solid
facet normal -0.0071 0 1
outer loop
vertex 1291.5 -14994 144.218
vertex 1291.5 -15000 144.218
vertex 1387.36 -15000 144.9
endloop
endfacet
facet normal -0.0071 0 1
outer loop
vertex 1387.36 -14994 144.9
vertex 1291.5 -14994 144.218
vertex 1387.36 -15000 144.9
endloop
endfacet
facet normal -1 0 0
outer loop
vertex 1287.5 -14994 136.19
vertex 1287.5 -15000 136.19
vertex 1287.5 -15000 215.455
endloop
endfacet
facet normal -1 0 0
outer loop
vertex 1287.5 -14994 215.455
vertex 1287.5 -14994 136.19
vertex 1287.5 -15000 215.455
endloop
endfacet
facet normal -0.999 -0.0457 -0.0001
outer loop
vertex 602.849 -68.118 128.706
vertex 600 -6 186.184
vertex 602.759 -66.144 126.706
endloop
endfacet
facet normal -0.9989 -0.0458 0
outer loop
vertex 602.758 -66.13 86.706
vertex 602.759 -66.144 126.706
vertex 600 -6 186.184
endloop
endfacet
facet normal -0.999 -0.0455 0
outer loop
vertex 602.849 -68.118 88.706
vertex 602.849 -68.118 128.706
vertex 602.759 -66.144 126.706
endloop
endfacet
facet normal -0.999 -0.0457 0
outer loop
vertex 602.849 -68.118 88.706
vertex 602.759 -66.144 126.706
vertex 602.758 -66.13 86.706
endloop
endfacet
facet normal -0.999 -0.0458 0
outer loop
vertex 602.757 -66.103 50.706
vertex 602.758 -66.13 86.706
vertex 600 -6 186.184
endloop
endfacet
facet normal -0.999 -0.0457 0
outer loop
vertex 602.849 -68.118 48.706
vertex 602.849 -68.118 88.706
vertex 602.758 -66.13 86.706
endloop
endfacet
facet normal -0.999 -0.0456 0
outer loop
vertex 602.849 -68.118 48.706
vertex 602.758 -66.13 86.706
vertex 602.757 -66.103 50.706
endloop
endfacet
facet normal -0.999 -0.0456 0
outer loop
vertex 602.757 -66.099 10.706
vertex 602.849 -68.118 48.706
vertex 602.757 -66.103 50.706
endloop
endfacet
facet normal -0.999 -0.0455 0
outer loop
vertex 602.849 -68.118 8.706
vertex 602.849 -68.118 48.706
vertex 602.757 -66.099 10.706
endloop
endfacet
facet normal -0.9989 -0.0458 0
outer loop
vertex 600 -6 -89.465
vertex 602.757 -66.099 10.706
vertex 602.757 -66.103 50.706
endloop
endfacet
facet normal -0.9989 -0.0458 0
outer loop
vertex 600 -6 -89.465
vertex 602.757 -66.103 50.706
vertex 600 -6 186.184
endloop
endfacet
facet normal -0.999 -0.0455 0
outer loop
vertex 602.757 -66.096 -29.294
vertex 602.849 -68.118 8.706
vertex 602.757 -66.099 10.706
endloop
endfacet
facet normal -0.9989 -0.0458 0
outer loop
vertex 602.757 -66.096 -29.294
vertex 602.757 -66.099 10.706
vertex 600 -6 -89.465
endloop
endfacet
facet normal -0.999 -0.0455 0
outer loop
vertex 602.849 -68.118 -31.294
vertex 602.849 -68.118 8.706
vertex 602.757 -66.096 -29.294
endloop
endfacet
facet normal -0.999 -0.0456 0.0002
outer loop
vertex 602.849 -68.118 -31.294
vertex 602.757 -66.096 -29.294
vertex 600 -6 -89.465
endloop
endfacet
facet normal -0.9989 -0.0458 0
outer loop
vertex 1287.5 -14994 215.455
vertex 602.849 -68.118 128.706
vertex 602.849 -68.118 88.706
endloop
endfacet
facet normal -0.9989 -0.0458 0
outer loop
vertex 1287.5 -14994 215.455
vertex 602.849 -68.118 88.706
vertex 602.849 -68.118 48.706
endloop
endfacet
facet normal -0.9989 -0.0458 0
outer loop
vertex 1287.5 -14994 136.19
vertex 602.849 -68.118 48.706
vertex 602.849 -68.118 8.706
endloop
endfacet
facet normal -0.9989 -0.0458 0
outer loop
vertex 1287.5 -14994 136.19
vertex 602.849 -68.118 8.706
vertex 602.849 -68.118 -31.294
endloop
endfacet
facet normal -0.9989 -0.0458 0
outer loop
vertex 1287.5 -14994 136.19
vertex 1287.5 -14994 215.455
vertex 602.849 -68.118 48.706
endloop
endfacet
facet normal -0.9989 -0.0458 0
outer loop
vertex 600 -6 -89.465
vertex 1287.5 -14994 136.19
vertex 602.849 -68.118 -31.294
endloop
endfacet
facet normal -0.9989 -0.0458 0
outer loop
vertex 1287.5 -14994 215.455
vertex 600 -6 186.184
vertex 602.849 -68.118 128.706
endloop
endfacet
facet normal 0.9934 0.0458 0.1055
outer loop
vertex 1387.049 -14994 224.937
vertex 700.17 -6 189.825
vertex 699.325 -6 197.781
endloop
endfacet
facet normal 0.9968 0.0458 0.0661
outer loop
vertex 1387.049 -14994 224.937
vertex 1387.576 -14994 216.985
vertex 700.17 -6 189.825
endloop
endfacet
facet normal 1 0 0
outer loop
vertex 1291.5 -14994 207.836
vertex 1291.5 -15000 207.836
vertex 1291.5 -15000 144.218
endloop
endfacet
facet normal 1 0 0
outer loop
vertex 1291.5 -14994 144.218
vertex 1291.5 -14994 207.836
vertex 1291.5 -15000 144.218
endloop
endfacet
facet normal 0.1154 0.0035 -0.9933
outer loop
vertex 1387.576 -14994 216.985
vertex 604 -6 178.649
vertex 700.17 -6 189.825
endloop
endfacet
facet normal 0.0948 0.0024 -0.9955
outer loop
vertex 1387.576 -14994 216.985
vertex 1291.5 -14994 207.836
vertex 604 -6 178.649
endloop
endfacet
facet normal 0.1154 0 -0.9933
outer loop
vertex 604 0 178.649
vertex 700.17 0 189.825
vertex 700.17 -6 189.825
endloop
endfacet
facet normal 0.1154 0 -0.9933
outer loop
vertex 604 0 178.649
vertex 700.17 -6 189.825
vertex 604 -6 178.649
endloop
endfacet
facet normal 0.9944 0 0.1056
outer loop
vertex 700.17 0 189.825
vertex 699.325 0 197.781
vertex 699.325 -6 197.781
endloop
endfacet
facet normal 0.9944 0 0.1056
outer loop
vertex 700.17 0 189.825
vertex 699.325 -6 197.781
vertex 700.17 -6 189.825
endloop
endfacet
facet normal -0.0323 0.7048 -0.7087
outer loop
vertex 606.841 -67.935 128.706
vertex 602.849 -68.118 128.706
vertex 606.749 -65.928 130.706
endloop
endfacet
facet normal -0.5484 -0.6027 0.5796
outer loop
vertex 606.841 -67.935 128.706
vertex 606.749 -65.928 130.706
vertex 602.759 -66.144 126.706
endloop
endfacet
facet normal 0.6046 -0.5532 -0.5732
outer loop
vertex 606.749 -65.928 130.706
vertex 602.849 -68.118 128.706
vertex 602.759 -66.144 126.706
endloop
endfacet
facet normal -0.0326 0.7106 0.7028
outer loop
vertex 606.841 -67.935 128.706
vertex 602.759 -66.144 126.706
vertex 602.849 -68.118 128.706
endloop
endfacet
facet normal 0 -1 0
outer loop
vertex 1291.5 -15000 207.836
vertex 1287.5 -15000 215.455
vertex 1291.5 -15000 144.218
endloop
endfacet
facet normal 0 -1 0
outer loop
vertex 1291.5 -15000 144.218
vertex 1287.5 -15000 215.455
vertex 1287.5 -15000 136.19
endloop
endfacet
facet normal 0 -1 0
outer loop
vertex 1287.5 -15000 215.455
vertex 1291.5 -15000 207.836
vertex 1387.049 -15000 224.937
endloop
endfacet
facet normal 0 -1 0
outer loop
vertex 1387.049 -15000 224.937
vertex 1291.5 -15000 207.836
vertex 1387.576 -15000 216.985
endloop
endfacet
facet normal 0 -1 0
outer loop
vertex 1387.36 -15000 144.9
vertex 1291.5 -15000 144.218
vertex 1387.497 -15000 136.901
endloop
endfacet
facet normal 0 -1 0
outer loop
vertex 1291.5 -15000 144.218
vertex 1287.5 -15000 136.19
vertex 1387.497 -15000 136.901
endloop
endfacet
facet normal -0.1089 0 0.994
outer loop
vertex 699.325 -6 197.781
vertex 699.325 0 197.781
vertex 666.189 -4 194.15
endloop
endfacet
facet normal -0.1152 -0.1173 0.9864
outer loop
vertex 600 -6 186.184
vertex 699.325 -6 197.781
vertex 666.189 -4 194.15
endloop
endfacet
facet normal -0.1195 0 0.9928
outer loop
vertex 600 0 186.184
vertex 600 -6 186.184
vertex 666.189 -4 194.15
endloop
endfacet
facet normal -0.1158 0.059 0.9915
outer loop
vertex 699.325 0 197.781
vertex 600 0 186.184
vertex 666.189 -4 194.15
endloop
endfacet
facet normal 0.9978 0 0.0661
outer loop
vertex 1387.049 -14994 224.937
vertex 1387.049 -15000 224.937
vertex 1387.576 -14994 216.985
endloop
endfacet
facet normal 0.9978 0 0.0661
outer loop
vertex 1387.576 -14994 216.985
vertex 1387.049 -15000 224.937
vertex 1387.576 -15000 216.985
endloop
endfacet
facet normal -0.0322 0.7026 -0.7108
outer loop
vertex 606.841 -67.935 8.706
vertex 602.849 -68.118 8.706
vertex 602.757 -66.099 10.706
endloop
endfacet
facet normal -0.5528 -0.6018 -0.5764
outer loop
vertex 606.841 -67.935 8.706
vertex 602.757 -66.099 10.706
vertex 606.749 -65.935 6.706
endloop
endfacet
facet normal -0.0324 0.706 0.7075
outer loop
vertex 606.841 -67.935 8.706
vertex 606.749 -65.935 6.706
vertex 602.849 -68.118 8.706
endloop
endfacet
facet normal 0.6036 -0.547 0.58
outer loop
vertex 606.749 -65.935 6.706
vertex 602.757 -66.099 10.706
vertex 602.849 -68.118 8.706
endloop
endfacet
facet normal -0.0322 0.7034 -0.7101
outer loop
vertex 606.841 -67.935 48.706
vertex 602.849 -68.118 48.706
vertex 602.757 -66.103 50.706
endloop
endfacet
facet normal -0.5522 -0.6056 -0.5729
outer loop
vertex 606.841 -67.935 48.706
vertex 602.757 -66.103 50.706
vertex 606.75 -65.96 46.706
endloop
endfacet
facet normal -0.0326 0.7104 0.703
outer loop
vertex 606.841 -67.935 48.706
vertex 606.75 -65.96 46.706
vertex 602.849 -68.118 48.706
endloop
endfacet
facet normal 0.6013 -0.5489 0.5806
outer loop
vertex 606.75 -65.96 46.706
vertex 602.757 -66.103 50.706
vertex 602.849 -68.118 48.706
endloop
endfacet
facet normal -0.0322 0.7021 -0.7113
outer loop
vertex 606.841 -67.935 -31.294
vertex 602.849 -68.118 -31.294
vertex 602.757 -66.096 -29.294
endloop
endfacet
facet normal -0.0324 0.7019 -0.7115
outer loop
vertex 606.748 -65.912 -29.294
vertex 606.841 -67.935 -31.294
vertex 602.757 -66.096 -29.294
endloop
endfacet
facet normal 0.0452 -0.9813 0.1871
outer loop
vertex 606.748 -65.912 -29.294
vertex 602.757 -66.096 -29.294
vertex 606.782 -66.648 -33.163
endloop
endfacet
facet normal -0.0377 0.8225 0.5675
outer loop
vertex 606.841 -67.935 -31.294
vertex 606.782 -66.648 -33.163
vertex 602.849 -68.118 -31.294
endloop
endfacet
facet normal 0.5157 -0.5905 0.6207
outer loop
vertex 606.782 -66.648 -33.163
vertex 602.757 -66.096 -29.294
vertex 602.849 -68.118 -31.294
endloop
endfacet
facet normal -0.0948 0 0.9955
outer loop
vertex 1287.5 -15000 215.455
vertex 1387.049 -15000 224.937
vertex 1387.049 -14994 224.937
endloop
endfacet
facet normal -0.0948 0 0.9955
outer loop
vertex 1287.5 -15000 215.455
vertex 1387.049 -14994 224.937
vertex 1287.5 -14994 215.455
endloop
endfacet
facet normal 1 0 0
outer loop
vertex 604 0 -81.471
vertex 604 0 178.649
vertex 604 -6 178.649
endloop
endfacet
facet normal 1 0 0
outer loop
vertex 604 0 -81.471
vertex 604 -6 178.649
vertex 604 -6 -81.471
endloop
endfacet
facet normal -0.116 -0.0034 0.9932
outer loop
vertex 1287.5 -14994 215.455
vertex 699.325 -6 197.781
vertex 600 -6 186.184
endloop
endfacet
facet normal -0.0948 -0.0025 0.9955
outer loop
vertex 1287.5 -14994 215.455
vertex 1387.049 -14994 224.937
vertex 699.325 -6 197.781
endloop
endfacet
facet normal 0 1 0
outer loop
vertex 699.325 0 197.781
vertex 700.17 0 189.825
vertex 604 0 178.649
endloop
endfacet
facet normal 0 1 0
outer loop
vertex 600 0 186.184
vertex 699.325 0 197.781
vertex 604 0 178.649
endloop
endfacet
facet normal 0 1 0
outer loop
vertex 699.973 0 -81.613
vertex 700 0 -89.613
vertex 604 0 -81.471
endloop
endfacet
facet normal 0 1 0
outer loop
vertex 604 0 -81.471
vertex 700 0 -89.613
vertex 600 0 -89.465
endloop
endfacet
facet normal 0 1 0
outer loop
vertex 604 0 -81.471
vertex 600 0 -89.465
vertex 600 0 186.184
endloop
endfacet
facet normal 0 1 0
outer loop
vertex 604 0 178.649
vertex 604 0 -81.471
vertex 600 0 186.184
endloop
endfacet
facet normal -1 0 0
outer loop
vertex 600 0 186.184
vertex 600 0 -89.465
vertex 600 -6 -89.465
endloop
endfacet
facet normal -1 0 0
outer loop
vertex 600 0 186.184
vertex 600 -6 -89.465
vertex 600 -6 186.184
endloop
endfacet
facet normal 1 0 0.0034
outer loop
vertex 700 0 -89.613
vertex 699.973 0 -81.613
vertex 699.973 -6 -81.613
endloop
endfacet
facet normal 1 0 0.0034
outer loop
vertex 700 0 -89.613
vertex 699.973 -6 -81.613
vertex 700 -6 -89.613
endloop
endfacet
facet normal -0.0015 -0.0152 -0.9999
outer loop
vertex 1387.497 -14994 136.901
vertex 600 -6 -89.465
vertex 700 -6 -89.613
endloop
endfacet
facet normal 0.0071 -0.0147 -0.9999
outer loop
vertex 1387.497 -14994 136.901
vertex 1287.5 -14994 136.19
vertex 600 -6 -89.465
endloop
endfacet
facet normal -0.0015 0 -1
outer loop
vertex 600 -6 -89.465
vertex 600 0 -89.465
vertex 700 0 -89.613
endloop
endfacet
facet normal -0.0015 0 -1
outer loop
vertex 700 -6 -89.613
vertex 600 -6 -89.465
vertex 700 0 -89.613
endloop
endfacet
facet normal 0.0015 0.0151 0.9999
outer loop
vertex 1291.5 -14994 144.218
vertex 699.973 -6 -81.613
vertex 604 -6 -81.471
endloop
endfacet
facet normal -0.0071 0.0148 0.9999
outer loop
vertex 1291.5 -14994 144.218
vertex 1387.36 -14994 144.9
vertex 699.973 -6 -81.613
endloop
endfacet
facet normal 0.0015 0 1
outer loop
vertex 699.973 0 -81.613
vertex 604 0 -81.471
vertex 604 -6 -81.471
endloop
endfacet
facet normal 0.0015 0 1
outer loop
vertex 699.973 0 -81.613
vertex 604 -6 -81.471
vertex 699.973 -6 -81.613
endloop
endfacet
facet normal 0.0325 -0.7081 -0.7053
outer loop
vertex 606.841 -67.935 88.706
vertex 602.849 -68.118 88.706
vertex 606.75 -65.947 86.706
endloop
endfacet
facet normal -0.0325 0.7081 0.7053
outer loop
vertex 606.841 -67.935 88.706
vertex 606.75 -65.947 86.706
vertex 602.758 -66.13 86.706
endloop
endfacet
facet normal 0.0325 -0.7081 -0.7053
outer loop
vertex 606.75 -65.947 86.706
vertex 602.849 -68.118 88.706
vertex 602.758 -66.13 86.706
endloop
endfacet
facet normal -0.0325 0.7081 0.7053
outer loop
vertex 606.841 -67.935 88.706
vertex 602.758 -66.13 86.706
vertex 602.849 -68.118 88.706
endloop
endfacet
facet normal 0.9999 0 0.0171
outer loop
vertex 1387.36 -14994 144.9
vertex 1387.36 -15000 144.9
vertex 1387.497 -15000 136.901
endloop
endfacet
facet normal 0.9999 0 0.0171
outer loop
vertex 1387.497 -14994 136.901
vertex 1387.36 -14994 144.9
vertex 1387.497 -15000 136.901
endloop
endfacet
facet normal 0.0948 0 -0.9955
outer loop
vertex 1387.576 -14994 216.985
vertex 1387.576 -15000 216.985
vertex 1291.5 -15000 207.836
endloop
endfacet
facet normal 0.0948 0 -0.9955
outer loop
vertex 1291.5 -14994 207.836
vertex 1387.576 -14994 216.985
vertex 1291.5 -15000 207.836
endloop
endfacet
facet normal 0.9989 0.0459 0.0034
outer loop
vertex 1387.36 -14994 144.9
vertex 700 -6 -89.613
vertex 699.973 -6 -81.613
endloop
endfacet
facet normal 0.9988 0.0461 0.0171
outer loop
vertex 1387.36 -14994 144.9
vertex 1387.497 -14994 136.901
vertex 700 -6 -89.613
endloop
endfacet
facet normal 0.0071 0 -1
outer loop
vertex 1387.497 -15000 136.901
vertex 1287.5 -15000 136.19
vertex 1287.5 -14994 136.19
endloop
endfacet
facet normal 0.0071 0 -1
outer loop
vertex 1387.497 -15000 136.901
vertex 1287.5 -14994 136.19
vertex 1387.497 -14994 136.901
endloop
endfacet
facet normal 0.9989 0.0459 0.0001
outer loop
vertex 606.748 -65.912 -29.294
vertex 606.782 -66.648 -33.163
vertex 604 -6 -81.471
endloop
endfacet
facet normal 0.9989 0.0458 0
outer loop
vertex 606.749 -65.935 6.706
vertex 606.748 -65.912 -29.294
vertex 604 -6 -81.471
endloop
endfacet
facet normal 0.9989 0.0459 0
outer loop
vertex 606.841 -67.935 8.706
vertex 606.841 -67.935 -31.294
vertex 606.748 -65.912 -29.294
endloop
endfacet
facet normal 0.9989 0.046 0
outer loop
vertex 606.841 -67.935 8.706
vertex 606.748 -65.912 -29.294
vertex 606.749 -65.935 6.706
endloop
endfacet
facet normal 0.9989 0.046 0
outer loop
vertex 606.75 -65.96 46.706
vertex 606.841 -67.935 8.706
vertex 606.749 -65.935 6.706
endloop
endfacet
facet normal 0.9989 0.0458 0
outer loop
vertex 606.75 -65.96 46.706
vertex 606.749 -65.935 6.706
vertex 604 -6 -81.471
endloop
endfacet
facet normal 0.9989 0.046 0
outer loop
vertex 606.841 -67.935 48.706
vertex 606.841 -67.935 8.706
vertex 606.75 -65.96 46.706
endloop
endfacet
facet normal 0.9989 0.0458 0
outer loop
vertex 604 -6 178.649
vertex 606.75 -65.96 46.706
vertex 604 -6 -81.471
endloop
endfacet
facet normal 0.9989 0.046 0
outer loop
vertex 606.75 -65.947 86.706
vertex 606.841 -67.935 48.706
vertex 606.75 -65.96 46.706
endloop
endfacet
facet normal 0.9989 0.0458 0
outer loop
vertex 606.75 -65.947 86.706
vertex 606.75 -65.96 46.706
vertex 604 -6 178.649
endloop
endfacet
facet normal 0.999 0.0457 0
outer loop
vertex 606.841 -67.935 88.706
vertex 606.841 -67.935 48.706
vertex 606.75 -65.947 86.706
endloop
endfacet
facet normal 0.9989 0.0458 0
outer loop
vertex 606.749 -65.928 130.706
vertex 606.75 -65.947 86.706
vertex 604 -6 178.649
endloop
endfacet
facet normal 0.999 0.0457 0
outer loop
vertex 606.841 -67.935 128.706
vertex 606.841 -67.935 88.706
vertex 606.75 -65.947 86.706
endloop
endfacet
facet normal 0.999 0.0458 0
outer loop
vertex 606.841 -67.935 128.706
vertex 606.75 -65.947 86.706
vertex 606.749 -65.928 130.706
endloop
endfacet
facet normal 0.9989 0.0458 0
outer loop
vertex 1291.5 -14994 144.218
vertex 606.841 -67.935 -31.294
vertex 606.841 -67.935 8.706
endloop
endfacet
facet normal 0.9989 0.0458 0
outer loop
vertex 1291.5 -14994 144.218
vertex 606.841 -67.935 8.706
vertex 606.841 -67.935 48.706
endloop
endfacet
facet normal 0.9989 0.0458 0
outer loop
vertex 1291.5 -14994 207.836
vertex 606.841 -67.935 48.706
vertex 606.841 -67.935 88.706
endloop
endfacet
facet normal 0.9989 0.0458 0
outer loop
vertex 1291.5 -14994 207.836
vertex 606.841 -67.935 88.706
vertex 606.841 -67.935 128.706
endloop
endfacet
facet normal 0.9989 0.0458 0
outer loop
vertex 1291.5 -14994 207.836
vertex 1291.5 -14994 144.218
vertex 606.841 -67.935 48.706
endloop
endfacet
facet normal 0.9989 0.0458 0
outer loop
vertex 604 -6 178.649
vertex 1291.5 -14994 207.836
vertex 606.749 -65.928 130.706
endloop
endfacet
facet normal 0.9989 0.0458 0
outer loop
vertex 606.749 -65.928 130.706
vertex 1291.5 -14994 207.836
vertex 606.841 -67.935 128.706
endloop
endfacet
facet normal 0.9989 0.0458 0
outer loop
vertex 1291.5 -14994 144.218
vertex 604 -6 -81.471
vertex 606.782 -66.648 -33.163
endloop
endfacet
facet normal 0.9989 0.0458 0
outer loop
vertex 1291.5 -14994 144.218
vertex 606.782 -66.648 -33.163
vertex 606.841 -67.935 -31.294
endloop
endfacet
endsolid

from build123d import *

# Parameters (mm, degrees)
BOSS_EXTRUDE1_DEPTH       = 6
BOSS_EXTRUDE2_DEPTH       = 6
F_4_0MM_DOWEL_HOLE1_D     = 4
F_4_0MM_DOWEL_HOLE1_DEPTH = 691.055627624


with BuildPart() as part:
    # Sketch1 → Boss-Extrude1 (new body)
    with BuildSketch(Plane(origin=(0, 0, 0), x_dir=(1, 0, 0), z_dir=(0, 1, 0))):
        with BuildLine():
            add(Edge.make_bspline(
                [(600, 89.46459172), (602.959954579, 89.484565354), (636.288713828, 89.692302977), (669.6237834, 89.714357551), (700, 89.613057684)],
                knots=[0.57911038, 0.57911038, 0.57911038, 0.57911038, 0.580209466, 0.591485786, 0.591485786, 0.591485786, 0.591485786], degree=3))
            Line((600, 89.46459172), (600, -186.184281919))
            add(Edge.make_bspline(
                [(699.325355788, -197.780561394), (666.175999226, -194.262835331), (633.063278118, -190.410650527), (600, -186.184281919)],
                knots=[0.410156143, 0.410156143, 0.410156143, 0.410156143, 0.422530239, 0.422530239, 0.422530239, 0.422530239], degree=3))
            Line((699.325355788, -197.780561394), (700.169555672, -189.82522818))
            Line((700.169555672, -189.82522818), (603.999995587, -178.649131078))
            Line((603.999995587, -178.649131078), (603.999995587, 81.470533717))
            Line((603.999995587, 81.470533717), (699.973321417, 81.613102169))
            Line((699.973321417, 81.613102169), (700, 89.613057684))
        make_face()
    extrude(amount=-BOSS_EXTRUDE1_DEPTH)



with BuildPart() as body_2:
    # Sketch2 → Boss-Extrude2 (new body)
    with BuildSketch(Plane(origin=(0, -15000, 0), x_dir=(1, 0, 0), z_dir=(0, 1, 0))):
        with BuildLine():
            Line((1387.360193502, -144.900282568), (1387.497467773, -136.901460418))
            add(Edge.make_bspline(
                [(1287.5, -136.189815087), (1288.424985806, -136.183573327), (1310.049834391, -136.048785988), (1343.389593971, -136.226565365), (1375.794996952, -136.700624831), (1387.497467773, -136.901460418)],
                knots=[0.57911038, 0.57911038, 0.57911038, 0.57911038, 0.580209466, 0.604805069, 0.618709183, 0.618709183, 0.618709183, 0.618709183], degree=3))
            Line((1287.5, -136.189815087), (1287.5, -215.4550881))
            add(Edge.make_bspline(
                [(1387.048556653, -224.93727991), (1373.893130502, -224.064248291), (1340.651757958, -221.513080746), (1307.489329718, -218.010257468), (1287.5, -215.4550881)],
                knots=[0.382928957, 0.382928957, 0.382928957, 0.382928957, 0.398590699, 0.422530239, 0.422530239, 0.422530239, 0.422530239], degree=3))
            Line((1387.048556653, -224.93727991), (1387.576309659, -216.984743553))
            Line((1387.576309659, -216.984743553), (1291.5, -207.835983658))
            Line((1291.5, -207.835983658), (1291.5, -144.218273573))
            Line((1291.5, -144.218273573), (1387.360193502, -144.900282568))
        make_face()
    extrude(amount=BOSS_EXTRUDE2_DEPTH)


with BuildPart() as part_1:
    add(part.part)

    add(body_2.part)  # loft1 joins it to this body
    # loft from a face of the part (loft1)
    loft([part_1.faces().sort_by_distance((600.955915883, -6, 48.589298681))[0], part_1.faces().sort_by_distance((1385.977348347, -14994, 220.872411694))[0]])

    # Ø4.0mm Dowel Hole1
    with Locations(Plane(origin=(604.759954203, -22.567650438, -62.95369296), x_dir=(-0.04582184903055539, 0.9989496274344474, 0), z_dir=(0.9989496274344474, 0.04582184903055539, 1.045988805960479e-14))):
        with Locations((-43.414815533, 111.659709576), (-43.414815533, 151.659709576), (-43.414815533, 191.659709576), (-43.414815533, 71.659709576), (-43.414815533, 31.659709576)):
            Hole(F_4_0MM_DOWEL_HOLE1_D / 2, depth=F_4_0MM_DOWEL_HOLE1_DEPTH)


solid = part_1.part
